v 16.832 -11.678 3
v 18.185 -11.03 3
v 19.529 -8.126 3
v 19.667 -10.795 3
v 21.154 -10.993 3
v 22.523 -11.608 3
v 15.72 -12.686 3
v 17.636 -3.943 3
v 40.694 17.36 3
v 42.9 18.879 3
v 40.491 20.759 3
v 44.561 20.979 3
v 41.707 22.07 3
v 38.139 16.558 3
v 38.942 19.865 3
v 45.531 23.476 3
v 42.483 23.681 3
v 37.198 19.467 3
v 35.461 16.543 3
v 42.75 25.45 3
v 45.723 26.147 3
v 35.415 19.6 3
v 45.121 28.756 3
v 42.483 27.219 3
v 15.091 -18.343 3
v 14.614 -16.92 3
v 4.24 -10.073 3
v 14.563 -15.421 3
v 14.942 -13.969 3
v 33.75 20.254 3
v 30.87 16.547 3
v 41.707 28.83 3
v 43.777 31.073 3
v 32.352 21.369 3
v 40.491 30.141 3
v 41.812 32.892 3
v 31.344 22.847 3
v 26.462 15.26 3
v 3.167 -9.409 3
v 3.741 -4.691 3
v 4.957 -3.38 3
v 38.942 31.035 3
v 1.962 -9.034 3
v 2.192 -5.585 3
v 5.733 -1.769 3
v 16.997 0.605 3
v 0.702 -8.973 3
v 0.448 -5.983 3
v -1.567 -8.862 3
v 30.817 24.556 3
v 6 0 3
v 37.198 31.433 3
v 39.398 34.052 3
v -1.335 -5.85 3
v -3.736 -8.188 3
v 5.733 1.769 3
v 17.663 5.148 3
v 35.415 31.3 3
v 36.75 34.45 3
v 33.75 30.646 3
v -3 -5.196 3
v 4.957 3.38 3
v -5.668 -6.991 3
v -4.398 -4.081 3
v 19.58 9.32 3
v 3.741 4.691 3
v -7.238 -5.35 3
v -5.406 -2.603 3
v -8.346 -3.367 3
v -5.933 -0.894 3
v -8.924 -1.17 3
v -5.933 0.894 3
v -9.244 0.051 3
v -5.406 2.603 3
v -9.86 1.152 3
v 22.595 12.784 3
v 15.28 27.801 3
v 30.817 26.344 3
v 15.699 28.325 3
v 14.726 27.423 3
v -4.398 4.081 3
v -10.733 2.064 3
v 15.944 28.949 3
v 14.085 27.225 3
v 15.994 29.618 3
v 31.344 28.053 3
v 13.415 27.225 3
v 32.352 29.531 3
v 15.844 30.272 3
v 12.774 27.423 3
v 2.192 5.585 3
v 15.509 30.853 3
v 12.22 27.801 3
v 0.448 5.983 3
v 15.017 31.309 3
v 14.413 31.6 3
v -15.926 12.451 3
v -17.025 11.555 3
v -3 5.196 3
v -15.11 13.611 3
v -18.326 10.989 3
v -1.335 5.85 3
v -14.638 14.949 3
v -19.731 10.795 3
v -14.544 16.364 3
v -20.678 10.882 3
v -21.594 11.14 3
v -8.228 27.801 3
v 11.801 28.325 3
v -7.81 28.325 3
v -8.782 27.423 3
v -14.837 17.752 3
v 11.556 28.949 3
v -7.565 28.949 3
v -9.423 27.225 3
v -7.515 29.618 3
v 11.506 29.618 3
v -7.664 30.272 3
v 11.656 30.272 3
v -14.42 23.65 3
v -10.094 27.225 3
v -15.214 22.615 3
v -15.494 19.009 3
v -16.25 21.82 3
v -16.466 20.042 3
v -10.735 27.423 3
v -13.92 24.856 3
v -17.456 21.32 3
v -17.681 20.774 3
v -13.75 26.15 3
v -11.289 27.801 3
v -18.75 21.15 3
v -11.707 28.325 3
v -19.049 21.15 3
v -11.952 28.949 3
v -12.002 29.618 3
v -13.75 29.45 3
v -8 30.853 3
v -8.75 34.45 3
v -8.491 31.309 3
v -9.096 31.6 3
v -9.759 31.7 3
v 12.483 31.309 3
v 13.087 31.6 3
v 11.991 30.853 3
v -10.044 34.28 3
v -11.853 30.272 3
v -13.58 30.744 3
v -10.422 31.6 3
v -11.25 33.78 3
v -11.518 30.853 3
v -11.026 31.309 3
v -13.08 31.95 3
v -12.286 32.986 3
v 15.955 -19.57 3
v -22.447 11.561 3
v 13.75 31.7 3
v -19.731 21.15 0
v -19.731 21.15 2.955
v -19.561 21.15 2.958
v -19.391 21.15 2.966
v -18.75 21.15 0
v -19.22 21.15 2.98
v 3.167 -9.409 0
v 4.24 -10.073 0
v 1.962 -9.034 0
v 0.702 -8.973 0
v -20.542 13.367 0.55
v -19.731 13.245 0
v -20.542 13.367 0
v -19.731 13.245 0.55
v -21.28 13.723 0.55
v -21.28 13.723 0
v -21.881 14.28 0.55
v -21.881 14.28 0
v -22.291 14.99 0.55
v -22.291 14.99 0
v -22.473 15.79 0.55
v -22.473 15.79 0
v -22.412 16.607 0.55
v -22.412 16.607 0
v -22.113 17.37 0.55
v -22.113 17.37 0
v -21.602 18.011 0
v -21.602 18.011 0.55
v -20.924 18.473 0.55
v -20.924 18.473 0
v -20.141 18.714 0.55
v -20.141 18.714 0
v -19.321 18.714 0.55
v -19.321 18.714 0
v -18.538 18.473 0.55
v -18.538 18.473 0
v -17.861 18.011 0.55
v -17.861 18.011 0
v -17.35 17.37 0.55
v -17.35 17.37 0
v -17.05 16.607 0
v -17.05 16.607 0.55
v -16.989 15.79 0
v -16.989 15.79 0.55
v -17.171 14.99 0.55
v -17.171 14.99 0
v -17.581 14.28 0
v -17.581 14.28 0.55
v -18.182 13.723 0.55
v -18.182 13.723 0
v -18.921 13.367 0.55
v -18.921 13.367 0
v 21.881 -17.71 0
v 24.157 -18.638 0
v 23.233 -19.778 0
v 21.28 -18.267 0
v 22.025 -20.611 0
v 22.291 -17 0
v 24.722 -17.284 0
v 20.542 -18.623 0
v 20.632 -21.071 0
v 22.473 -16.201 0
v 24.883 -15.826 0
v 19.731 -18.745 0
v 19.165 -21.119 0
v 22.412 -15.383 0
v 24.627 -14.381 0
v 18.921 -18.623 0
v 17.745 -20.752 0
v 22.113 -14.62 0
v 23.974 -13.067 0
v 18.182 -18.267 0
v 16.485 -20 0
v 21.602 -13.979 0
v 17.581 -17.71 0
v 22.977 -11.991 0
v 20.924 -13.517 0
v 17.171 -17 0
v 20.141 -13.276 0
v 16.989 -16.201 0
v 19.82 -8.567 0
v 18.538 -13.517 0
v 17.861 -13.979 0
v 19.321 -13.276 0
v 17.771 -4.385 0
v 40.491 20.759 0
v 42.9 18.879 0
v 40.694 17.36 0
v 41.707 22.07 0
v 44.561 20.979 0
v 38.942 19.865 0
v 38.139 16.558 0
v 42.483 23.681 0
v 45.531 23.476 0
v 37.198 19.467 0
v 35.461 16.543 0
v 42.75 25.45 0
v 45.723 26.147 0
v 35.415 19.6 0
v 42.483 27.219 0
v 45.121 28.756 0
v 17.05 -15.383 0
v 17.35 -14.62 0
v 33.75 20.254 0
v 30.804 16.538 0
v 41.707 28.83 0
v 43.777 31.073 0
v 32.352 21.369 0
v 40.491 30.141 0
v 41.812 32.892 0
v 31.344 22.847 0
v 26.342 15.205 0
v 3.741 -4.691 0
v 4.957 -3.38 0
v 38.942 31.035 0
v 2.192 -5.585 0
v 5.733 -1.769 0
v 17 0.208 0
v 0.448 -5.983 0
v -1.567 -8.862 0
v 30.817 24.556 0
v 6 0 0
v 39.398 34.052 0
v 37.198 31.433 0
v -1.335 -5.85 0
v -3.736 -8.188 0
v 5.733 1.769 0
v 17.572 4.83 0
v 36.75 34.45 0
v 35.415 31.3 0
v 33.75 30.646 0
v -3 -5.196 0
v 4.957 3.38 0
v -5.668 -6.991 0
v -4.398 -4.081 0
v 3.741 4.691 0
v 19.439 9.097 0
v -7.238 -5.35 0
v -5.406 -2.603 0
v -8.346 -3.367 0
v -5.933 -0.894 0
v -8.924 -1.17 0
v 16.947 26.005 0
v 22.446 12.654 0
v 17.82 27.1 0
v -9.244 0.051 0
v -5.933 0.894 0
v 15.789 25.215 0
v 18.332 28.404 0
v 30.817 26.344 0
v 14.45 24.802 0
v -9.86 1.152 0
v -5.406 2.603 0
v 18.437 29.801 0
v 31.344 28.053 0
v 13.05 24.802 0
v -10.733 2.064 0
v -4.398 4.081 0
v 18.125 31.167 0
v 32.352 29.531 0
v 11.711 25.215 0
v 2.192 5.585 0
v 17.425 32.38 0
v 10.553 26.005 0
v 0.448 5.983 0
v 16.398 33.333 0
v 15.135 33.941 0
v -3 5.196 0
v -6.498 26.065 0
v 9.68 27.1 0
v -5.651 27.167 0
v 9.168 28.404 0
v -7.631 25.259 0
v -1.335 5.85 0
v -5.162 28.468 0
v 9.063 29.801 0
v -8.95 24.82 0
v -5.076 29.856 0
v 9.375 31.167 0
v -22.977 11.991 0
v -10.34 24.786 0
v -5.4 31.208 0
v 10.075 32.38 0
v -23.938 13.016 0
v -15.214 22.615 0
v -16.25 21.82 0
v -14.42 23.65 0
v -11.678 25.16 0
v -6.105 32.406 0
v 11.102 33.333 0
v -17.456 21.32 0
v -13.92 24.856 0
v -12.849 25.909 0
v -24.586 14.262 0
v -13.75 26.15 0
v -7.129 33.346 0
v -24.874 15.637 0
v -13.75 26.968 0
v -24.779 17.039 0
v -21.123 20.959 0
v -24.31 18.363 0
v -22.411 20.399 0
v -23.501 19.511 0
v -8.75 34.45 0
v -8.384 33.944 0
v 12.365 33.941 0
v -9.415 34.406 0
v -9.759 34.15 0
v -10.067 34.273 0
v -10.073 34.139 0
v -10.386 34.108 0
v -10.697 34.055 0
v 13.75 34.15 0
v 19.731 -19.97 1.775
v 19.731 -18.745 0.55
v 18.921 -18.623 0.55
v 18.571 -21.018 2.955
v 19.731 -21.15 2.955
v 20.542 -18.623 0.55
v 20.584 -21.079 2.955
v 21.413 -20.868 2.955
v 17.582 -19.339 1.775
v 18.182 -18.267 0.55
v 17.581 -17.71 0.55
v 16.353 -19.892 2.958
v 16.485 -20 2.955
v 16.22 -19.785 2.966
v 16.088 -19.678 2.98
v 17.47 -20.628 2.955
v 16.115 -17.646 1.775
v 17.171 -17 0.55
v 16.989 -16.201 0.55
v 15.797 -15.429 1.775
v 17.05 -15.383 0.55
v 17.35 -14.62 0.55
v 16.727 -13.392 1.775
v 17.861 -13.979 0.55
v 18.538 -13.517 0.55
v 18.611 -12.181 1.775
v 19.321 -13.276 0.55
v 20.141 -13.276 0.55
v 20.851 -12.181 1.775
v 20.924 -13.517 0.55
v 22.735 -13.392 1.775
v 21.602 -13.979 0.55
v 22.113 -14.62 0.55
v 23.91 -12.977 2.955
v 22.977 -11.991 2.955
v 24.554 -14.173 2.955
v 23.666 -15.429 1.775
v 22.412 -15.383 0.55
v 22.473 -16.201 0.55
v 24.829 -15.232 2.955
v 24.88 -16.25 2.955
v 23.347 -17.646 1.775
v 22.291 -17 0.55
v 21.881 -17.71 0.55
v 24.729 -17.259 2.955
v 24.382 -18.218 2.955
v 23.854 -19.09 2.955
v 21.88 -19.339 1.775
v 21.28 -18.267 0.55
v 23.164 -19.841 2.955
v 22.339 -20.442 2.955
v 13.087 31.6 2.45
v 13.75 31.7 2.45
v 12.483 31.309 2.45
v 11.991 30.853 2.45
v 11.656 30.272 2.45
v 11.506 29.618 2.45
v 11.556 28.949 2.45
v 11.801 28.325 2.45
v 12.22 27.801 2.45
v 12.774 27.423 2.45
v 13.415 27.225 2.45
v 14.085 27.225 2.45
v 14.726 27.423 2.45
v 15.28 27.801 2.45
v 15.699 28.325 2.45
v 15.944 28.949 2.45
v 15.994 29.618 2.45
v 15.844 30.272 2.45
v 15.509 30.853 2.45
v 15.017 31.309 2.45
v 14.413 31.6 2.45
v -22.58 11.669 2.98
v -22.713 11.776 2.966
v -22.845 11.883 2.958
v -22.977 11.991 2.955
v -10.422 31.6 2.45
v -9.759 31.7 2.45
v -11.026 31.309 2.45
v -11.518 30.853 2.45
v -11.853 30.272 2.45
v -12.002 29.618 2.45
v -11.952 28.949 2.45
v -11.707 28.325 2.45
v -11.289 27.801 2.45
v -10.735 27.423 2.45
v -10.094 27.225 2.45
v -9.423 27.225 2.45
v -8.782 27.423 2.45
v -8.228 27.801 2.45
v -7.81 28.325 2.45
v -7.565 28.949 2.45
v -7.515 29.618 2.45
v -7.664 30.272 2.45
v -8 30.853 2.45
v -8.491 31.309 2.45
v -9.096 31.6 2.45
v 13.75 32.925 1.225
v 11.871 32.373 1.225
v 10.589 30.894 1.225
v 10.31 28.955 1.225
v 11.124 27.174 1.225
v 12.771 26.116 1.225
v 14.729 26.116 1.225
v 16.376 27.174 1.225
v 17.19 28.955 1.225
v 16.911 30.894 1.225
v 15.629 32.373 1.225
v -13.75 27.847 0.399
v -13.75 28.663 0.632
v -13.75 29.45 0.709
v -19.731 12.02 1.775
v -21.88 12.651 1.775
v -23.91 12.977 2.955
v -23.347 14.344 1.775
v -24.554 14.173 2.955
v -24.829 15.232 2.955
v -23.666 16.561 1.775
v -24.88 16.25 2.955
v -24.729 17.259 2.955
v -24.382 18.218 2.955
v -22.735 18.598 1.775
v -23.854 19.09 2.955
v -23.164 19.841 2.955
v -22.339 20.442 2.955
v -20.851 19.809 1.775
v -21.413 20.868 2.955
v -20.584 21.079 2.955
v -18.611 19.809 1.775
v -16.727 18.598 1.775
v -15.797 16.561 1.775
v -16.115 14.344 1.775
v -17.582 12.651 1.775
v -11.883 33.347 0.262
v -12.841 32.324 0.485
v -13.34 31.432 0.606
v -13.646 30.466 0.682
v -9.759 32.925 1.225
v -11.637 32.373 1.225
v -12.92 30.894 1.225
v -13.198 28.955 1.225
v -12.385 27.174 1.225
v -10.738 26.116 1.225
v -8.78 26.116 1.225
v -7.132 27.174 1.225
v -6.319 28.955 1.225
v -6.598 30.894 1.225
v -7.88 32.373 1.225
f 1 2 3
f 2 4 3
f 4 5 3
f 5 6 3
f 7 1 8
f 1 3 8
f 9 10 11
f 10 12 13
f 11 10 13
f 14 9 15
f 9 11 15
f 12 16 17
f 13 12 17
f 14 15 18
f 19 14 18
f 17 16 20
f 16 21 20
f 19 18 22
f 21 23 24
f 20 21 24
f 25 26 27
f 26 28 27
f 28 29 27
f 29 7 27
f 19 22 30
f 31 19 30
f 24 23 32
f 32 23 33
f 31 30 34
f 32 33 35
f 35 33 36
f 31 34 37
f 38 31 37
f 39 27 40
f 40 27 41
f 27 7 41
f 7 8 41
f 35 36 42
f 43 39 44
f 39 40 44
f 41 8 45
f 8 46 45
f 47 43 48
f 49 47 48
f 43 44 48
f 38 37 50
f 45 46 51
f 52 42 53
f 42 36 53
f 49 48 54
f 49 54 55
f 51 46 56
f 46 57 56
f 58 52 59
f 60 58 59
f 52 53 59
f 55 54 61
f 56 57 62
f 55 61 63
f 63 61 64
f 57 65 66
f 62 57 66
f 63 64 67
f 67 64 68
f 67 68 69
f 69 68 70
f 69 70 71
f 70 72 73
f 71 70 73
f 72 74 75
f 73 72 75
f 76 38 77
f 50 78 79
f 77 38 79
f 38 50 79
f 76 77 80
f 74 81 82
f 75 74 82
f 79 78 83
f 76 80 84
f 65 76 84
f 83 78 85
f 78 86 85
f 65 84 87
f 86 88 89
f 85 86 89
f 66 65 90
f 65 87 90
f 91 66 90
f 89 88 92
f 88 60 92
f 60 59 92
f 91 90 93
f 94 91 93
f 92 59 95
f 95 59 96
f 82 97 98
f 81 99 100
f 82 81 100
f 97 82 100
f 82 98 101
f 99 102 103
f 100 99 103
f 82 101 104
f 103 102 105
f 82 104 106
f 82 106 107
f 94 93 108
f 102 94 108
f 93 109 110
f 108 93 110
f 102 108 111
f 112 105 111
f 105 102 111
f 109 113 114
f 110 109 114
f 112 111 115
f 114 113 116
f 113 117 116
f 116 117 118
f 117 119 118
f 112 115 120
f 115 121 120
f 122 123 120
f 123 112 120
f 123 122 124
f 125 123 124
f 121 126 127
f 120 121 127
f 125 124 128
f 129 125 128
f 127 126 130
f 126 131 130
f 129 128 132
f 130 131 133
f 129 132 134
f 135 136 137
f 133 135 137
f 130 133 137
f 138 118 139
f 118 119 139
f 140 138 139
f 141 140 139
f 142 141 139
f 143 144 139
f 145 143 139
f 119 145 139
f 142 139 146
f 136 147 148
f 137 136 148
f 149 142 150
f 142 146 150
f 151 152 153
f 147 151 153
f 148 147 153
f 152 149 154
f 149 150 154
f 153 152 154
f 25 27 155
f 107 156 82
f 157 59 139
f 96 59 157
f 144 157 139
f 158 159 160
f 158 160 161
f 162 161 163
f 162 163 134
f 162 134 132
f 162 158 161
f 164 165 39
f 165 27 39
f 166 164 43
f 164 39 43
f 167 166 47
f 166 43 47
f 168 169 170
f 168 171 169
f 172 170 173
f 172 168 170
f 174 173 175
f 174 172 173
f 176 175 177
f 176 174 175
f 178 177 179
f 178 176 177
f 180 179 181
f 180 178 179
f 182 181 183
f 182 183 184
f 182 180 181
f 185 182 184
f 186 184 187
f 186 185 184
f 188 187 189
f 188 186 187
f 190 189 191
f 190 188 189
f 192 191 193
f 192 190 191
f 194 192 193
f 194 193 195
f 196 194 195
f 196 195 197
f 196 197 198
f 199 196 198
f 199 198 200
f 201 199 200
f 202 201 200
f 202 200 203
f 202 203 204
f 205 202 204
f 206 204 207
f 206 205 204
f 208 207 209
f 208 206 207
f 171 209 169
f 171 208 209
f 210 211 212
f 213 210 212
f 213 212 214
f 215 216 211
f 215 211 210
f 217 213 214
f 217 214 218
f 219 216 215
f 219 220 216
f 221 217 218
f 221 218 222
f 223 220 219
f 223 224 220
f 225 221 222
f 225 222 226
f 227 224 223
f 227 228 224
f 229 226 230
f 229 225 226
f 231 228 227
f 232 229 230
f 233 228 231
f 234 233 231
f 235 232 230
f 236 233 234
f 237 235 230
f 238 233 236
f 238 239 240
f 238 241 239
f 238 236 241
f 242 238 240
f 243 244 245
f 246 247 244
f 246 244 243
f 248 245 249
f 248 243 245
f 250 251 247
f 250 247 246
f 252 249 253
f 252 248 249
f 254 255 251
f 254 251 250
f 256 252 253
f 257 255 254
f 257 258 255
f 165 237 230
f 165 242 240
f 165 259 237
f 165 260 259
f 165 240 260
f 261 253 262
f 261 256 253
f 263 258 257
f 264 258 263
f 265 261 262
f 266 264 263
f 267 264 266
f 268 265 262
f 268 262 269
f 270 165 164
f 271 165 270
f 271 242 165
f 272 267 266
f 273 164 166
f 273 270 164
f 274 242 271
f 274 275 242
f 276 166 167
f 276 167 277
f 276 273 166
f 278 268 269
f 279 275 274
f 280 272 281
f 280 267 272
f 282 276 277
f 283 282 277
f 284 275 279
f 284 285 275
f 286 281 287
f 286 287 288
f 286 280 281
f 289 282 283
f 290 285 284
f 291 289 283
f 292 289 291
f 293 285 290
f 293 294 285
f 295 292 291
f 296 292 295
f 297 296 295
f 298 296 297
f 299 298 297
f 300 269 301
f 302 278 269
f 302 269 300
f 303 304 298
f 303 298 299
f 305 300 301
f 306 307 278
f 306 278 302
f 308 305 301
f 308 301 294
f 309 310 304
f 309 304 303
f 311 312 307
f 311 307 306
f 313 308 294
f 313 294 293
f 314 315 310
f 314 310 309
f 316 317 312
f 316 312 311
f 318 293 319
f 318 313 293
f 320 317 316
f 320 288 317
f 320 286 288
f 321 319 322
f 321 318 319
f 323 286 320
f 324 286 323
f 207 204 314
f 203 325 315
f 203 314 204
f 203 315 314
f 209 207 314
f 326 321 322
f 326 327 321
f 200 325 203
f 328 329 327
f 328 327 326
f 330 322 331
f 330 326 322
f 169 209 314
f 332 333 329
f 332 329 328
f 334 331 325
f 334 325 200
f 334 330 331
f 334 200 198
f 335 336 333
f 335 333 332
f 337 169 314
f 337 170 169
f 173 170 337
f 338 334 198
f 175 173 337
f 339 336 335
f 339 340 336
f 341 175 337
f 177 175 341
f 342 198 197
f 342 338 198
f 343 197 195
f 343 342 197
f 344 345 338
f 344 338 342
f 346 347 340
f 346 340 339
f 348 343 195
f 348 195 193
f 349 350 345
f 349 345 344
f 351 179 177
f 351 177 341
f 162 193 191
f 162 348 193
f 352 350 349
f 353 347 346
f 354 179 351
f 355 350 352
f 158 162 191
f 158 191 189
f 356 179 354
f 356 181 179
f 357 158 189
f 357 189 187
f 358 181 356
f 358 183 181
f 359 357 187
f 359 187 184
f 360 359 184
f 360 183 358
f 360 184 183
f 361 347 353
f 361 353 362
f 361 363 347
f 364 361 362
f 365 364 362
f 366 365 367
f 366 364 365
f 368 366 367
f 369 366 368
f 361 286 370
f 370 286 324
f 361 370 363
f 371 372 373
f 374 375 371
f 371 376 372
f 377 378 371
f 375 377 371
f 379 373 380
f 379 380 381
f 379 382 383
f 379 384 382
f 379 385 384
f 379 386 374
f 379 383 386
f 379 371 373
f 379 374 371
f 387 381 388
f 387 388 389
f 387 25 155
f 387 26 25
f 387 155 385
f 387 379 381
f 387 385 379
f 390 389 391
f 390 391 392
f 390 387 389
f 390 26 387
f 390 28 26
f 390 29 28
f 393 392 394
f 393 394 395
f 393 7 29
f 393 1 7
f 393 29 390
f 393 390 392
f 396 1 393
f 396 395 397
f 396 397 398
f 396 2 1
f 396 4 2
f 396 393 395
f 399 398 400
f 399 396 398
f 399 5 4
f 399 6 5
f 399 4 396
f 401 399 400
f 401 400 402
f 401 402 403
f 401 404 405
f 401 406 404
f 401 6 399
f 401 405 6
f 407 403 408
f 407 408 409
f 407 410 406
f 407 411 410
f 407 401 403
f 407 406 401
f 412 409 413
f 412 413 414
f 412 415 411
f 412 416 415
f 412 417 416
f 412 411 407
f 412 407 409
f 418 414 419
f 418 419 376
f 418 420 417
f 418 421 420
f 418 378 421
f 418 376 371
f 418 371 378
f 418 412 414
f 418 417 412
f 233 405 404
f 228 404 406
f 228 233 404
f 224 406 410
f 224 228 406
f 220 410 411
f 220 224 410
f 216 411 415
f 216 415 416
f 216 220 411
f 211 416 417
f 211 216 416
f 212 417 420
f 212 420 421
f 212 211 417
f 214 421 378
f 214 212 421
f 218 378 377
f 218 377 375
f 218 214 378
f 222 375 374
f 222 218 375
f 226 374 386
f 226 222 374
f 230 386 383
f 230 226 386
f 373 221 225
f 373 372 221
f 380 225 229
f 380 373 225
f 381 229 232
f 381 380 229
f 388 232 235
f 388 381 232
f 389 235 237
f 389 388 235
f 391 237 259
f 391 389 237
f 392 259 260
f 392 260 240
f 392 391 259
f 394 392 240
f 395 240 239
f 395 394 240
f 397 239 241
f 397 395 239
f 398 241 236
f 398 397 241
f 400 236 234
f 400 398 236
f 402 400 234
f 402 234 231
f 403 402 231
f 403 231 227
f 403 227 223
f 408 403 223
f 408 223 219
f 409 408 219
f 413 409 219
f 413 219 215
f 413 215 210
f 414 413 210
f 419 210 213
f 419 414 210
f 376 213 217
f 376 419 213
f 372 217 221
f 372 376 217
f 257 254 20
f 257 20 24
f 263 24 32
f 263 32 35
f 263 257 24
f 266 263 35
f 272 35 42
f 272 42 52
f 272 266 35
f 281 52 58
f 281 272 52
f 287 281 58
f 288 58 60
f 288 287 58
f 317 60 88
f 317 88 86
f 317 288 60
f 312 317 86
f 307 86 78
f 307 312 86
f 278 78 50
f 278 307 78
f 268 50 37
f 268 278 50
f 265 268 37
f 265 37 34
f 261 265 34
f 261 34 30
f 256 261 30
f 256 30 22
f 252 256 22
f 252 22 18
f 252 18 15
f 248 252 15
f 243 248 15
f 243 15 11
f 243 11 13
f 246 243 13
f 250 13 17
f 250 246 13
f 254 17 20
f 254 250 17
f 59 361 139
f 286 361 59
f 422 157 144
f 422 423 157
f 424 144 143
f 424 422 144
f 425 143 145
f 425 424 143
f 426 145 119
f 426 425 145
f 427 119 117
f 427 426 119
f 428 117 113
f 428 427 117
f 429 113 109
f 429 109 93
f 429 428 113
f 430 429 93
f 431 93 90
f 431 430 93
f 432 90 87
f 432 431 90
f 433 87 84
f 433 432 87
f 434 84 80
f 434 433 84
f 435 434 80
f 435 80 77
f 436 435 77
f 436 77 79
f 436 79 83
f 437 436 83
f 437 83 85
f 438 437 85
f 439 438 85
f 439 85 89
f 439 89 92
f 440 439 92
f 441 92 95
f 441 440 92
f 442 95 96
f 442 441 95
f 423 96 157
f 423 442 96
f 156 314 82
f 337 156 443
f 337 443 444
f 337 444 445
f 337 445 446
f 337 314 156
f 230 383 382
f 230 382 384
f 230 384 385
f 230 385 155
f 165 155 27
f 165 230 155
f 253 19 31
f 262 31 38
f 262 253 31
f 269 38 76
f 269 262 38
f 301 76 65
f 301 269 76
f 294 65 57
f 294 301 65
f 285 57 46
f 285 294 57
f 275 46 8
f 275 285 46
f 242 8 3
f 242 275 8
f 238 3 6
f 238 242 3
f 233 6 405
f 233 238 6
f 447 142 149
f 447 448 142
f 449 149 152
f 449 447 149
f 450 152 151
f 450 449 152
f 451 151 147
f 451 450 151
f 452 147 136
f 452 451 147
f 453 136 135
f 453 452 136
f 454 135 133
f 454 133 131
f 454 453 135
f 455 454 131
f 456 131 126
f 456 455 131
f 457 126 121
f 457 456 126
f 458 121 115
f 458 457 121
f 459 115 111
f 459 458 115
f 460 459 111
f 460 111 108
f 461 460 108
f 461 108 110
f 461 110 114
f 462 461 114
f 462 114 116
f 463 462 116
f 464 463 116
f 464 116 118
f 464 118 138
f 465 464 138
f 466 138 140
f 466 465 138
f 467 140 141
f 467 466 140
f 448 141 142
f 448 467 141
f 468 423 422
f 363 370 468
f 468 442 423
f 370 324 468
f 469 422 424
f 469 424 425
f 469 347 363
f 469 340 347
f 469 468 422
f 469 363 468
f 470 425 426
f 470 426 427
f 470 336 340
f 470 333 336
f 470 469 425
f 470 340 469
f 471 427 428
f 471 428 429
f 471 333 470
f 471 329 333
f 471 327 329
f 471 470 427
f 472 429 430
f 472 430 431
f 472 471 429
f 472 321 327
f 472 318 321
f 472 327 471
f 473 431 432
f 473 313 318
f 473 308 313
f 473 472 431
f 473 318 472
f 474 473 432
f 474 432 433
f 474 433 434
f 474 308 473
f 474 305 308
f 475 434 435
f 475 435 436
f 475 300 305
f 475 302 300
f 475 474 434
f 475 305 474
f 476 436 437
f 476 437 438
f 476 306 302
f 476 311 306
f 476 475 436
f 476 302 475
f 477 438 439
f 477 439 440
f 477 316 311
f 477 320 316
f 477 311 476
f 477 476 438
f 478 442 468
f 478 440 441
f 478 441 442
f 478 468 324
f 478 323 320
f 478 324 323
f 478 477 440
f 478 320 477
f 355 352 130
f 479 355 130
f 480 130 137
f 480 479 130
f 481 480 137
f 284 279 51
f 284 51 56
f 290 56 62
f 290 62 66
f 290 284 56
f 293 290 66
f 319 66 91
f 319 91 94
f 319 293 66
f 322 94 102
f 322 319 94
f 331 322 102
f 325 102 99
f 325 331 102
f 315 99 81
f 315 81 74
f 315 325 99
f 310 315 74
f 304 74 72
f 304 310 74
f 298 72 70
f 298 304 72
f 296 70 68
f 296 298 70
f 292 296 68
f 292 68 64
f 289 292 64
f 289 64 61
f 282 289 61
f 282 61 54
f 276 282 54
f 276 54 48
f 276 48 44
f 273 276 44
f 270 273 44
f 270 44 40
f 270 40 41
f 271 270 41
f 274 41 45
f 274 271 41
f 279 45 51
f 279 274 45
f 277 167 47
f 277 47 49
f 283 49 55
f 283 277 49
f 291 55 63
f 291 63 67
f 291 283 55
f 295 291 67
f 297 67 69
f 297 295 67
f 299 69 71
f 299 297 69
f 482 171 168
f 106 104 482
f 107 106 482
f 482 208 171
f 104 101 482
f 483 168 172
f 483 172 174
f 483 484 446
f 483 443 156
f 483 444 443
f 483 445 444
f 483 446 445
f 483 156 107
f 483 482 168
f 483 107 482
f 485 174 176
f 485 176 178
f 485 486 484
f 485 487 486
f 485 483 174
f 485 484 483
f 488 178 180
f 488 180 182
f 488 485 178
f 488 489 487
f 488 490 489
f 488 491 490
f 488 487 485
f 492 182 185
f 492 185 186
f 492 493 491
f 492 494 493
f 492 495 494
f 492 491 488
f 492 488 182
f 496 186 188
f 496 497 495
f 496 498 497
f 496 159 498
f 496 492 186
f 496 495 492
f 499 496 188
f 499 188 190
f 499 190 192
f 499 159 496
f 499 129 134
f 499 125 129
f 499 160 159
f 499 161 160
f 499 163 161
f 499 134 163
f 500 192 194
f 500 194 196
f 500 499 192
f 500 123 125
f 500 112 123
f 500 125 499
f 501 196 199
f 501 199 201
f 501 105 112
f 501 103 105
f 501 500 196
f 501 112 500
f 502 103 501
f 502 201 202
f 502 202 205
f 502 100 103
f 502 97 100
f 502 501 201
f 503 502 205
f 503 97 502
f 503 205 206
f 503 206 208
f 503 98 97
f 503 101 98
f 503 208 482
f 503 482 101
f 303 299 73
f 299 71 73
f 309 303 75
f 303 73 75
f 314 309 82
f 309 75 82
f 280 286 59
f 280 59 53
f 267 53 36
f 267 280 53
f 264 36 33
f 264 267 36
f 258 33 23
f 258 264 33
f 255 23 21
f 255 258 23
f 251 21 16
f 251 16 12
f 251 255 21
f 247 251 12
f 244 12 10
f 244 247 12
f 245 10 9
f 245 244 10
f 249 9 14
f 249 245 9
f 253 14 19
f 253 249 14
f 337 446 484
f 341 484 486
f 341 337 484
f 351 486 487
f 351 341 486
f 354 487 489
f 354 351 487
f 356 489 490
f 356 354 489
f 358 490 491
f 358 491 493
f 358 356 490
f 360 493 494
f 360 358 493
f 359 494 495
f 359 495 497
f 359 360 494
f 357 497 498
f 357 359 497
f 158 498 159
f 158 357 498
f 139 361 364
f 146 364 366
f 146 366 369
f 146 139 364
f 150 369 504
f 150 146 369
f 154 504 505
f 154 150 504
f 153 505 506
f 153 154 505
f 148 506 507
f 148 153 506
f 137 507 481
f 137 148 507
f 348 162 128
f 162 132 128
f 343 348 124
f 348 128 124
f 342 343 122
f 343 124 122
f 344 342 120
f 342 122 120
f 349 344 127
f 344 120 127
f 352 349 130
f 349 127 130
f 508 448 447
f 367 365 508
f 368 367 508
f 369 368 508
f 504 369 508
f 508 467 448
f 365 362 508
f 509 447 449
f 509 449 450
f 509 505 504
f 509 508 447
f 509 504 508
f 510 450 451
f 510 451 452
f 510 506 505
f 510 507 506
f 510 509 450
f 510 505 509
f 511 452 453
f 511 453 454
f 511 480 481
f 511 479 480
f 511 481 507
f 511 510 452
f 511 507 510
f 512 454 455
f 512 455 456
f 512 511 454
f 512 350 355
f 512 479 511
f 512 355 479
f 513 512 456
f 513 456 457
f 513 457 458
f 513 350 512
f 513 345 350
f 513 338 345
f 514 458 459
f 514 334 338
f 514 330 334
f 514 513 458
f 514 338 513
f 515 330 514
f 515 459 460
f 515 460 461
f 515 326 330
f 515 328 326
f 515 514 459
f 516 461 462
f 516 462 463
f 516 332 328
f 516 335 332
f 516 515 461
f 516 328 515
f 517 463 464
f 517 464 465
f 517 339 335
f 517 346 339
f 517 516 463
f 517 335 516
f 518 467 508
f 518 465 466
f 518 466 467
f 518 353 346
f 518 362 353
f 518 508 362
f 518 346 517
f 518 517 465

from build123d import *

# Parameters (mm, degrees)
SKETCH1_R                                    = 2
SKETCH1_R_2                                  = 6
BOSS_EXTRUDE1_DEPTH                          = 3
FILLET1_R                                    = 5
CSK_FOR_M4_COUNTERSUNK_FLAT_HEAD_SCR_2_COUNT = 2
CSK_FOR_M4_COUNTERSUNK_FLAT_HEAD_SCR_2_PITCH = 23.508708273
CSK_FOR_M5_COUNTERSUNK_FLAT_HEAD_SCR_2_COUNT = 2
CSK_FOR_M5_COUNTERSUNK_FLAT_HEAD_SCR_2_PITCH = 50.8


with BuildPart() as part:
    # Sketch1 → Boss-Extrude1 (new body)
    with BuildSketch(Plane.XY):
        with BuildLine():
            Line((16.48489132, -19.999559574), (2.484638151, -8.650235445))
            ThreePointArc((2.484638151, -8.650235445), (-5.667544957, -6.991347092), (-8.977125763, 0.641258943))
            Line((-8.977125763, 0.641258943), (-22.977378932, 11.990583072))
            ThreePointArc((-22.977378932, 11.990583072), (-24.590001349, 17.71711779), (-19.731135126, 21.150071323))
            Line((-19.731135126, 21.150071323), (-14.065364661, 21.150071323))
            Line((-14.065364661, 21.150071323), (-13.75, 21.150071323))
            Line((-13.75, 21.150071323), (-13.75, 34.45))
            Line((-13.75, 34.45), (13.75, 34.45))
            Line((13.75, 34.45), (36.75, 34.45))
            ThreePointArc((36.75, 34.45), (45.726790692, 24.804067443), (35.461466363, 16.542717526))
            ThreePointArc((35.461466363, 16.542717526), (18.351015207, 7.031288175), (22.977378932, -11.990583072))
            ThreePointArc((22.977378932, -11.990583072), (23.735623377, -19.241315129), (16.48489132, -19.999559574))
        make_face()
        with Locations((-19.731135126, 15.995071323)):
            Circle(SKETCH1_R, mode=Mode.SUBTRACT)
        with Locations((19.731135126, -15.995071323)):
            Circle(SKETCH1_R, mode=Mode.SUBTRACT)
        Circle(SKETCH1_R_2, mode=Mode.SUBTRACT)
        with Locations((36.75, 25.45)):
            Circle(SKETCH1_R_2, mode=Mode.SUBTRACT)
    extrude(amount=BOSS_EXTRUDE1_DEPTH)

    # Fillet1
    fillet1_edges = [part.edges().sort_by_distance(p)[0] for p in [
        (2.484638151, -8.650235445, 1.5),
        (-8.977125763, 0.641258943, 1.5),
        (-13.75, 21.150071323, 1.5),
        (-13.75, 34.45, 1.5),
    ]]
    fillet(fillet1_edges, radius=FILLET1_R)

    # Sketch3 → CSK for M4 Countersunk Flat Head Screw1 (revolve, cut)
    with BuildSketch(Plane(origin=(13.75, 29.45, 0), x_dir=(0, 1, 0), z_dir=(1, 0, 0))):
        Polygon((0, 0), (0, 3), (2.25, 3), (2.25, 2.45), (4.7, 0), align=None)
    csk_for_m4_countersunk_flat_head_screw1 = revolve(axis=Axis((13.75, 29.45, -6.35), (0, 0, 1)), mode=Mode.SUBTRACT)

    # CSK for M4 Countersunk Flat Head Scr 2: CSK for M4 Countersunk Flat Head Screw1 ×2
    with Locations(*[(-i * CSK_FOR_M4_COUNTERSUNK_FLAT_HEAD_SCR_2_PITCH, 0, 0) for i in range(1, CSK_FOR_M4_COUNTERSUNK_FLAT_HEAD_SCR_2_COUNT)]):
        add(csk_for_m4_countersunk_flat_head_screw1, mode=Mode.SUBTRACT)

    # Sketch6 → CSK for M5 Countersunk Flat Head Screw1 (revolve, cut)
    with BuildSketch(Plane(origin=(-19.731135126, 15.995071323, 3), x_dir=(0, -1, 0), z_dir=(1, 0, 0))):
        Polygon((0, 0), (0, 3), (2.75, 3), (2.75, 2.45), (5.2, 0), align=None)
    csk_for_m5_countersunk_flat_head_screw1 = revolve(axis=Axis((-19.731135126, 15.995071323, 9.35), (0, 0, -1)), mode=Mode.SUBTRACT)

    # CSK for M5 Countersunk Flat Head Scr 2: CSK for M5 Countersunk Flat Head Screw1 ×2
    with Locations(*[Vector(0.7768163435563247, -0.6297272174392513, 0) * (i * CSK_FOR_M5_COUNTERSUNK_FLAT_HEAD_SCR_2_PITCH) for i in range(1, CSK_FOR_M5_COUNTERSUNK_FLAT_HEAD_SCR_2_COUNT)]):
        add(csk_for_m5_countersunk_flat_head_screw1, mode=Mode.SUBTRACT)


solid = part.part
